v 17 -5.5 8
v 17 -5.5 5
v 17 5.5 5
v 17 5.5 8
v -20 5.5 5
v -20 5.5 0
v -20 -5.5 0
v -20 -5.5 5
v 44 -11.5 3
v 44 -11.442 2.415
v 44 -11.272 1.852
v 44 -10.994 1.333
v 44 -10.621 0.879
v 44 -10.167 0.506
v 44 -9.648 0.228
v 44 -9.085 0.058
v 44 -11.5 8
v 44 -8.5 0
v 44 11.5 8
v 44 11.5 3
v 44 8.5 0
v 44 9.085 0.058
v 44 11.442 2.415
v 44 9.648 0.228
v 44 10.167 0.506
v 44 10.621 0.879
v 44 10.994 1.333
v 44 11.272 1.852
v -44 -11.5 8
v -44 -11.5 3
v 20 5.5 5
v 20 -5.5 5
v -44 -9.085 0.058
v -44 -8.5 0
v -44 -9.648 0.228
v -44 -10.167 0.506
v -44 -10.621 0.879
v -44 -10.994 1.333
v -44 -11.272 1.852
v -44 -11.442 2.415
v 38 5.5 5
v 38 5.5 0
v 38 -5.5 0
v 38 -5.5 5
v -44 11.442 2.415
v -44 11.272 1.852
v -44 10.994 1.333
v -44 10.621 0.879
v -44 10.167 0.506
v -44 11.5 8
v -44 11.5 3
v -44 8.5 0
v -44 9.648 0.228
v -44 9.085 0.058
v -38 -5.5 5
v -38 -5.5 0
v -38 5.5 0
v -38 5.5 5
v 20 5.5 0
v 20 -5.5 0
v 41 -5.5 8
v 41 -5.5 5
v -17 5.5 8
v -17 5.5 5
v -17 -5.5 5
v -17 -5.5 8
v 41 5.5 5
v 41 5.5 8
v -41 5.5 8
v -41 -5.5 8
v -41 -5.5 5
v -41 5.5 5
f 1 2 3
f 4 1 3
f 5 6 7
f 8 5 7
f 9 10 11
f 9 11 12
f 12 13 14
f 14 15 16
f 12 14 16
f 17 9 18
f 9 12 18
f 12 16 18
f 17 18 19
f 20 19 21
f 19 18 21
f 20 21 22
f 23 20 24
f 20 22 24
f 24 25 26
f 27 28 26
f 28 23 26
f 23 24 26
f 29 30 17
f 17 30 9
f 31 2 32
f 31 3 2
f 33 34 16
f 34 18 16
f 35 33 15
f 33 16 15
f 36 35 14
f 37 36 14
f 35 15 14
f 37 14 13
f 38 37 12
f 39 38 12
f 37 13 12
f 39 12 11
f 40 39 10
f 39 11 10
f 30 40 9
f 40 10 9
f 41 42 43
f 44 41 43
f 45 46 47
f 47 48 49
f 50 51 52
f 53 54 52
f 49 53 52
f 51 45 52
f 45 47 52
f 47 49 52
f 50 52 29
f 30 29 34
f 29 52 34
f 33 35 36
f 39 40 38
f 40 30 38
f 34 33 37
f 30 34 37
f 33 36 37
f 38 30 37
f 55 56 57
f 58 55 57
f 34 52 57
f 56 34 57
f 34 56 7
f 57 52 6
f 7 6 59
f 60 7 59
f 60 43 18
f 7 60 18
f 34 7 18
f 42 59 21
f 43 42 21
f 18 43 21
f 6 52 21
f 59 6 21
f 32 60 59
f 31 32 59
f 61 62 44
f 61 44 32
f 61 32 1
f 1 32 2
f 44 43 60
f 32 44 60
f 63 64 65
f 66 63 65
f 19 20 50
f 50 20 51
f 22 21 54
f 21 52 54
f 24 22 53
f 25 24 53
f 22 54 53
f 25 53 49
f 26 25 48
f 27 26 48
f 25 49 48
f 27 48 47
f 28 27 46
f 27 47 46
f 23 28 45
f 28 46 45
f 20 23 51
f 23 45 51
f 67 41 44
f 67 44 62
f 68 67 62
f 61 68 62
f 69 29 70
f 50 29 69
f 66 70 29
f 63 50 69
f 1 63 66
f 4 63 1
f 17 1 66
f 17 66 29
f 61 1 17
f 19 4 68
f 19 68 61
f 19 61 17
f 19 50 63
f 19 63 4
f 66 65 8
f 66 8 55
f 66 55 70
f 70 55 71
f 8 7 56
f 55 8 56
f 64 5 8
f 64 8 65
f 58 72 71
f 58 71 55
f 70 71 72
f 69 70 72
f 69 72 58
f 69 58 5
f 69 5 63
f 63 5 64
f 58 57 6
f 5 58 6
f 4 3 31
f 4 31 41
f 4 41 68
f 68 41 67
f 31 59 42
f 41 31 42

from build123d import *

# Parameters (mm, degrees)
F1_DEPTH = 5
F3_DEPTH = 3
F4_R     = 3


with BuildPart() as f1:
    # F0 (on Top) → F1 (new body)
    with BuildSketch(Plane.XY):
        Polygon((-44, 11.5), (-44, 0), (-44, -11.5), (0, -11.5), (44, -11.5), (44, 0), (44, 11.5), (0, 11.5), align=None)
        Polygon((-20, 5.5), (-20, 0), (-20, -5.5), (-38, -5.5), (-38, 0), (-38, 5.5), align=None, mode=Mode.SUBTRACT)
        Polygon((20, -5.5), (20, 0), (20, 5.5), (38, 5.5), (38, 0), (38, -5.5), align=None, mode=Mode.SUBTRACT)
    extrude(amount=F1_DEPTH)

    # F2 (on face) → F3 (join)
    with BuildSketch(Plane.XY.offset(5)):
        Polygon((-44, 11.5), (-44, 0), (-44, -11.5), (-14, -11.5), (-14, 0), (-14, 11.5), align=None)
        Polygon((-41, 5.5), (-38, 5.5), (-20, 5.5), (-17, 5.5), (-17, 0), (-17, -5.5), (-20, -5.5), (-38, -5.5), (-41, -5.5), (-41, 0), align=None, mode=Mode.SUBTRACT)
        Polygon((14, 11.5), (-14, 11.5), (-14, 0), (-14, -11.5), (14, -11.5), (14, 0), align=None)
        Polygon((44, 11.5), (14, 11.5), (14, 0), (14, -11.5), (44, -11.5), (44, 0), align=None)
        Polygon((17, 0), (17, 5.5), (41, 5.5), (41, 0), (41, -5.5), (17, -5.5), align=None, mode=Mode.SUBTRACT)
    extrude(amount=F3_DEPTH)

    # F4
    f4_edges = [f1.edges().sort_by_distance(p)[0] for p in [
        (0, -11.5, 0),
        (0, 11.5, 0),
    ]]
    fillet(f4_edges, radius=F4_R)


solid = f1.part
